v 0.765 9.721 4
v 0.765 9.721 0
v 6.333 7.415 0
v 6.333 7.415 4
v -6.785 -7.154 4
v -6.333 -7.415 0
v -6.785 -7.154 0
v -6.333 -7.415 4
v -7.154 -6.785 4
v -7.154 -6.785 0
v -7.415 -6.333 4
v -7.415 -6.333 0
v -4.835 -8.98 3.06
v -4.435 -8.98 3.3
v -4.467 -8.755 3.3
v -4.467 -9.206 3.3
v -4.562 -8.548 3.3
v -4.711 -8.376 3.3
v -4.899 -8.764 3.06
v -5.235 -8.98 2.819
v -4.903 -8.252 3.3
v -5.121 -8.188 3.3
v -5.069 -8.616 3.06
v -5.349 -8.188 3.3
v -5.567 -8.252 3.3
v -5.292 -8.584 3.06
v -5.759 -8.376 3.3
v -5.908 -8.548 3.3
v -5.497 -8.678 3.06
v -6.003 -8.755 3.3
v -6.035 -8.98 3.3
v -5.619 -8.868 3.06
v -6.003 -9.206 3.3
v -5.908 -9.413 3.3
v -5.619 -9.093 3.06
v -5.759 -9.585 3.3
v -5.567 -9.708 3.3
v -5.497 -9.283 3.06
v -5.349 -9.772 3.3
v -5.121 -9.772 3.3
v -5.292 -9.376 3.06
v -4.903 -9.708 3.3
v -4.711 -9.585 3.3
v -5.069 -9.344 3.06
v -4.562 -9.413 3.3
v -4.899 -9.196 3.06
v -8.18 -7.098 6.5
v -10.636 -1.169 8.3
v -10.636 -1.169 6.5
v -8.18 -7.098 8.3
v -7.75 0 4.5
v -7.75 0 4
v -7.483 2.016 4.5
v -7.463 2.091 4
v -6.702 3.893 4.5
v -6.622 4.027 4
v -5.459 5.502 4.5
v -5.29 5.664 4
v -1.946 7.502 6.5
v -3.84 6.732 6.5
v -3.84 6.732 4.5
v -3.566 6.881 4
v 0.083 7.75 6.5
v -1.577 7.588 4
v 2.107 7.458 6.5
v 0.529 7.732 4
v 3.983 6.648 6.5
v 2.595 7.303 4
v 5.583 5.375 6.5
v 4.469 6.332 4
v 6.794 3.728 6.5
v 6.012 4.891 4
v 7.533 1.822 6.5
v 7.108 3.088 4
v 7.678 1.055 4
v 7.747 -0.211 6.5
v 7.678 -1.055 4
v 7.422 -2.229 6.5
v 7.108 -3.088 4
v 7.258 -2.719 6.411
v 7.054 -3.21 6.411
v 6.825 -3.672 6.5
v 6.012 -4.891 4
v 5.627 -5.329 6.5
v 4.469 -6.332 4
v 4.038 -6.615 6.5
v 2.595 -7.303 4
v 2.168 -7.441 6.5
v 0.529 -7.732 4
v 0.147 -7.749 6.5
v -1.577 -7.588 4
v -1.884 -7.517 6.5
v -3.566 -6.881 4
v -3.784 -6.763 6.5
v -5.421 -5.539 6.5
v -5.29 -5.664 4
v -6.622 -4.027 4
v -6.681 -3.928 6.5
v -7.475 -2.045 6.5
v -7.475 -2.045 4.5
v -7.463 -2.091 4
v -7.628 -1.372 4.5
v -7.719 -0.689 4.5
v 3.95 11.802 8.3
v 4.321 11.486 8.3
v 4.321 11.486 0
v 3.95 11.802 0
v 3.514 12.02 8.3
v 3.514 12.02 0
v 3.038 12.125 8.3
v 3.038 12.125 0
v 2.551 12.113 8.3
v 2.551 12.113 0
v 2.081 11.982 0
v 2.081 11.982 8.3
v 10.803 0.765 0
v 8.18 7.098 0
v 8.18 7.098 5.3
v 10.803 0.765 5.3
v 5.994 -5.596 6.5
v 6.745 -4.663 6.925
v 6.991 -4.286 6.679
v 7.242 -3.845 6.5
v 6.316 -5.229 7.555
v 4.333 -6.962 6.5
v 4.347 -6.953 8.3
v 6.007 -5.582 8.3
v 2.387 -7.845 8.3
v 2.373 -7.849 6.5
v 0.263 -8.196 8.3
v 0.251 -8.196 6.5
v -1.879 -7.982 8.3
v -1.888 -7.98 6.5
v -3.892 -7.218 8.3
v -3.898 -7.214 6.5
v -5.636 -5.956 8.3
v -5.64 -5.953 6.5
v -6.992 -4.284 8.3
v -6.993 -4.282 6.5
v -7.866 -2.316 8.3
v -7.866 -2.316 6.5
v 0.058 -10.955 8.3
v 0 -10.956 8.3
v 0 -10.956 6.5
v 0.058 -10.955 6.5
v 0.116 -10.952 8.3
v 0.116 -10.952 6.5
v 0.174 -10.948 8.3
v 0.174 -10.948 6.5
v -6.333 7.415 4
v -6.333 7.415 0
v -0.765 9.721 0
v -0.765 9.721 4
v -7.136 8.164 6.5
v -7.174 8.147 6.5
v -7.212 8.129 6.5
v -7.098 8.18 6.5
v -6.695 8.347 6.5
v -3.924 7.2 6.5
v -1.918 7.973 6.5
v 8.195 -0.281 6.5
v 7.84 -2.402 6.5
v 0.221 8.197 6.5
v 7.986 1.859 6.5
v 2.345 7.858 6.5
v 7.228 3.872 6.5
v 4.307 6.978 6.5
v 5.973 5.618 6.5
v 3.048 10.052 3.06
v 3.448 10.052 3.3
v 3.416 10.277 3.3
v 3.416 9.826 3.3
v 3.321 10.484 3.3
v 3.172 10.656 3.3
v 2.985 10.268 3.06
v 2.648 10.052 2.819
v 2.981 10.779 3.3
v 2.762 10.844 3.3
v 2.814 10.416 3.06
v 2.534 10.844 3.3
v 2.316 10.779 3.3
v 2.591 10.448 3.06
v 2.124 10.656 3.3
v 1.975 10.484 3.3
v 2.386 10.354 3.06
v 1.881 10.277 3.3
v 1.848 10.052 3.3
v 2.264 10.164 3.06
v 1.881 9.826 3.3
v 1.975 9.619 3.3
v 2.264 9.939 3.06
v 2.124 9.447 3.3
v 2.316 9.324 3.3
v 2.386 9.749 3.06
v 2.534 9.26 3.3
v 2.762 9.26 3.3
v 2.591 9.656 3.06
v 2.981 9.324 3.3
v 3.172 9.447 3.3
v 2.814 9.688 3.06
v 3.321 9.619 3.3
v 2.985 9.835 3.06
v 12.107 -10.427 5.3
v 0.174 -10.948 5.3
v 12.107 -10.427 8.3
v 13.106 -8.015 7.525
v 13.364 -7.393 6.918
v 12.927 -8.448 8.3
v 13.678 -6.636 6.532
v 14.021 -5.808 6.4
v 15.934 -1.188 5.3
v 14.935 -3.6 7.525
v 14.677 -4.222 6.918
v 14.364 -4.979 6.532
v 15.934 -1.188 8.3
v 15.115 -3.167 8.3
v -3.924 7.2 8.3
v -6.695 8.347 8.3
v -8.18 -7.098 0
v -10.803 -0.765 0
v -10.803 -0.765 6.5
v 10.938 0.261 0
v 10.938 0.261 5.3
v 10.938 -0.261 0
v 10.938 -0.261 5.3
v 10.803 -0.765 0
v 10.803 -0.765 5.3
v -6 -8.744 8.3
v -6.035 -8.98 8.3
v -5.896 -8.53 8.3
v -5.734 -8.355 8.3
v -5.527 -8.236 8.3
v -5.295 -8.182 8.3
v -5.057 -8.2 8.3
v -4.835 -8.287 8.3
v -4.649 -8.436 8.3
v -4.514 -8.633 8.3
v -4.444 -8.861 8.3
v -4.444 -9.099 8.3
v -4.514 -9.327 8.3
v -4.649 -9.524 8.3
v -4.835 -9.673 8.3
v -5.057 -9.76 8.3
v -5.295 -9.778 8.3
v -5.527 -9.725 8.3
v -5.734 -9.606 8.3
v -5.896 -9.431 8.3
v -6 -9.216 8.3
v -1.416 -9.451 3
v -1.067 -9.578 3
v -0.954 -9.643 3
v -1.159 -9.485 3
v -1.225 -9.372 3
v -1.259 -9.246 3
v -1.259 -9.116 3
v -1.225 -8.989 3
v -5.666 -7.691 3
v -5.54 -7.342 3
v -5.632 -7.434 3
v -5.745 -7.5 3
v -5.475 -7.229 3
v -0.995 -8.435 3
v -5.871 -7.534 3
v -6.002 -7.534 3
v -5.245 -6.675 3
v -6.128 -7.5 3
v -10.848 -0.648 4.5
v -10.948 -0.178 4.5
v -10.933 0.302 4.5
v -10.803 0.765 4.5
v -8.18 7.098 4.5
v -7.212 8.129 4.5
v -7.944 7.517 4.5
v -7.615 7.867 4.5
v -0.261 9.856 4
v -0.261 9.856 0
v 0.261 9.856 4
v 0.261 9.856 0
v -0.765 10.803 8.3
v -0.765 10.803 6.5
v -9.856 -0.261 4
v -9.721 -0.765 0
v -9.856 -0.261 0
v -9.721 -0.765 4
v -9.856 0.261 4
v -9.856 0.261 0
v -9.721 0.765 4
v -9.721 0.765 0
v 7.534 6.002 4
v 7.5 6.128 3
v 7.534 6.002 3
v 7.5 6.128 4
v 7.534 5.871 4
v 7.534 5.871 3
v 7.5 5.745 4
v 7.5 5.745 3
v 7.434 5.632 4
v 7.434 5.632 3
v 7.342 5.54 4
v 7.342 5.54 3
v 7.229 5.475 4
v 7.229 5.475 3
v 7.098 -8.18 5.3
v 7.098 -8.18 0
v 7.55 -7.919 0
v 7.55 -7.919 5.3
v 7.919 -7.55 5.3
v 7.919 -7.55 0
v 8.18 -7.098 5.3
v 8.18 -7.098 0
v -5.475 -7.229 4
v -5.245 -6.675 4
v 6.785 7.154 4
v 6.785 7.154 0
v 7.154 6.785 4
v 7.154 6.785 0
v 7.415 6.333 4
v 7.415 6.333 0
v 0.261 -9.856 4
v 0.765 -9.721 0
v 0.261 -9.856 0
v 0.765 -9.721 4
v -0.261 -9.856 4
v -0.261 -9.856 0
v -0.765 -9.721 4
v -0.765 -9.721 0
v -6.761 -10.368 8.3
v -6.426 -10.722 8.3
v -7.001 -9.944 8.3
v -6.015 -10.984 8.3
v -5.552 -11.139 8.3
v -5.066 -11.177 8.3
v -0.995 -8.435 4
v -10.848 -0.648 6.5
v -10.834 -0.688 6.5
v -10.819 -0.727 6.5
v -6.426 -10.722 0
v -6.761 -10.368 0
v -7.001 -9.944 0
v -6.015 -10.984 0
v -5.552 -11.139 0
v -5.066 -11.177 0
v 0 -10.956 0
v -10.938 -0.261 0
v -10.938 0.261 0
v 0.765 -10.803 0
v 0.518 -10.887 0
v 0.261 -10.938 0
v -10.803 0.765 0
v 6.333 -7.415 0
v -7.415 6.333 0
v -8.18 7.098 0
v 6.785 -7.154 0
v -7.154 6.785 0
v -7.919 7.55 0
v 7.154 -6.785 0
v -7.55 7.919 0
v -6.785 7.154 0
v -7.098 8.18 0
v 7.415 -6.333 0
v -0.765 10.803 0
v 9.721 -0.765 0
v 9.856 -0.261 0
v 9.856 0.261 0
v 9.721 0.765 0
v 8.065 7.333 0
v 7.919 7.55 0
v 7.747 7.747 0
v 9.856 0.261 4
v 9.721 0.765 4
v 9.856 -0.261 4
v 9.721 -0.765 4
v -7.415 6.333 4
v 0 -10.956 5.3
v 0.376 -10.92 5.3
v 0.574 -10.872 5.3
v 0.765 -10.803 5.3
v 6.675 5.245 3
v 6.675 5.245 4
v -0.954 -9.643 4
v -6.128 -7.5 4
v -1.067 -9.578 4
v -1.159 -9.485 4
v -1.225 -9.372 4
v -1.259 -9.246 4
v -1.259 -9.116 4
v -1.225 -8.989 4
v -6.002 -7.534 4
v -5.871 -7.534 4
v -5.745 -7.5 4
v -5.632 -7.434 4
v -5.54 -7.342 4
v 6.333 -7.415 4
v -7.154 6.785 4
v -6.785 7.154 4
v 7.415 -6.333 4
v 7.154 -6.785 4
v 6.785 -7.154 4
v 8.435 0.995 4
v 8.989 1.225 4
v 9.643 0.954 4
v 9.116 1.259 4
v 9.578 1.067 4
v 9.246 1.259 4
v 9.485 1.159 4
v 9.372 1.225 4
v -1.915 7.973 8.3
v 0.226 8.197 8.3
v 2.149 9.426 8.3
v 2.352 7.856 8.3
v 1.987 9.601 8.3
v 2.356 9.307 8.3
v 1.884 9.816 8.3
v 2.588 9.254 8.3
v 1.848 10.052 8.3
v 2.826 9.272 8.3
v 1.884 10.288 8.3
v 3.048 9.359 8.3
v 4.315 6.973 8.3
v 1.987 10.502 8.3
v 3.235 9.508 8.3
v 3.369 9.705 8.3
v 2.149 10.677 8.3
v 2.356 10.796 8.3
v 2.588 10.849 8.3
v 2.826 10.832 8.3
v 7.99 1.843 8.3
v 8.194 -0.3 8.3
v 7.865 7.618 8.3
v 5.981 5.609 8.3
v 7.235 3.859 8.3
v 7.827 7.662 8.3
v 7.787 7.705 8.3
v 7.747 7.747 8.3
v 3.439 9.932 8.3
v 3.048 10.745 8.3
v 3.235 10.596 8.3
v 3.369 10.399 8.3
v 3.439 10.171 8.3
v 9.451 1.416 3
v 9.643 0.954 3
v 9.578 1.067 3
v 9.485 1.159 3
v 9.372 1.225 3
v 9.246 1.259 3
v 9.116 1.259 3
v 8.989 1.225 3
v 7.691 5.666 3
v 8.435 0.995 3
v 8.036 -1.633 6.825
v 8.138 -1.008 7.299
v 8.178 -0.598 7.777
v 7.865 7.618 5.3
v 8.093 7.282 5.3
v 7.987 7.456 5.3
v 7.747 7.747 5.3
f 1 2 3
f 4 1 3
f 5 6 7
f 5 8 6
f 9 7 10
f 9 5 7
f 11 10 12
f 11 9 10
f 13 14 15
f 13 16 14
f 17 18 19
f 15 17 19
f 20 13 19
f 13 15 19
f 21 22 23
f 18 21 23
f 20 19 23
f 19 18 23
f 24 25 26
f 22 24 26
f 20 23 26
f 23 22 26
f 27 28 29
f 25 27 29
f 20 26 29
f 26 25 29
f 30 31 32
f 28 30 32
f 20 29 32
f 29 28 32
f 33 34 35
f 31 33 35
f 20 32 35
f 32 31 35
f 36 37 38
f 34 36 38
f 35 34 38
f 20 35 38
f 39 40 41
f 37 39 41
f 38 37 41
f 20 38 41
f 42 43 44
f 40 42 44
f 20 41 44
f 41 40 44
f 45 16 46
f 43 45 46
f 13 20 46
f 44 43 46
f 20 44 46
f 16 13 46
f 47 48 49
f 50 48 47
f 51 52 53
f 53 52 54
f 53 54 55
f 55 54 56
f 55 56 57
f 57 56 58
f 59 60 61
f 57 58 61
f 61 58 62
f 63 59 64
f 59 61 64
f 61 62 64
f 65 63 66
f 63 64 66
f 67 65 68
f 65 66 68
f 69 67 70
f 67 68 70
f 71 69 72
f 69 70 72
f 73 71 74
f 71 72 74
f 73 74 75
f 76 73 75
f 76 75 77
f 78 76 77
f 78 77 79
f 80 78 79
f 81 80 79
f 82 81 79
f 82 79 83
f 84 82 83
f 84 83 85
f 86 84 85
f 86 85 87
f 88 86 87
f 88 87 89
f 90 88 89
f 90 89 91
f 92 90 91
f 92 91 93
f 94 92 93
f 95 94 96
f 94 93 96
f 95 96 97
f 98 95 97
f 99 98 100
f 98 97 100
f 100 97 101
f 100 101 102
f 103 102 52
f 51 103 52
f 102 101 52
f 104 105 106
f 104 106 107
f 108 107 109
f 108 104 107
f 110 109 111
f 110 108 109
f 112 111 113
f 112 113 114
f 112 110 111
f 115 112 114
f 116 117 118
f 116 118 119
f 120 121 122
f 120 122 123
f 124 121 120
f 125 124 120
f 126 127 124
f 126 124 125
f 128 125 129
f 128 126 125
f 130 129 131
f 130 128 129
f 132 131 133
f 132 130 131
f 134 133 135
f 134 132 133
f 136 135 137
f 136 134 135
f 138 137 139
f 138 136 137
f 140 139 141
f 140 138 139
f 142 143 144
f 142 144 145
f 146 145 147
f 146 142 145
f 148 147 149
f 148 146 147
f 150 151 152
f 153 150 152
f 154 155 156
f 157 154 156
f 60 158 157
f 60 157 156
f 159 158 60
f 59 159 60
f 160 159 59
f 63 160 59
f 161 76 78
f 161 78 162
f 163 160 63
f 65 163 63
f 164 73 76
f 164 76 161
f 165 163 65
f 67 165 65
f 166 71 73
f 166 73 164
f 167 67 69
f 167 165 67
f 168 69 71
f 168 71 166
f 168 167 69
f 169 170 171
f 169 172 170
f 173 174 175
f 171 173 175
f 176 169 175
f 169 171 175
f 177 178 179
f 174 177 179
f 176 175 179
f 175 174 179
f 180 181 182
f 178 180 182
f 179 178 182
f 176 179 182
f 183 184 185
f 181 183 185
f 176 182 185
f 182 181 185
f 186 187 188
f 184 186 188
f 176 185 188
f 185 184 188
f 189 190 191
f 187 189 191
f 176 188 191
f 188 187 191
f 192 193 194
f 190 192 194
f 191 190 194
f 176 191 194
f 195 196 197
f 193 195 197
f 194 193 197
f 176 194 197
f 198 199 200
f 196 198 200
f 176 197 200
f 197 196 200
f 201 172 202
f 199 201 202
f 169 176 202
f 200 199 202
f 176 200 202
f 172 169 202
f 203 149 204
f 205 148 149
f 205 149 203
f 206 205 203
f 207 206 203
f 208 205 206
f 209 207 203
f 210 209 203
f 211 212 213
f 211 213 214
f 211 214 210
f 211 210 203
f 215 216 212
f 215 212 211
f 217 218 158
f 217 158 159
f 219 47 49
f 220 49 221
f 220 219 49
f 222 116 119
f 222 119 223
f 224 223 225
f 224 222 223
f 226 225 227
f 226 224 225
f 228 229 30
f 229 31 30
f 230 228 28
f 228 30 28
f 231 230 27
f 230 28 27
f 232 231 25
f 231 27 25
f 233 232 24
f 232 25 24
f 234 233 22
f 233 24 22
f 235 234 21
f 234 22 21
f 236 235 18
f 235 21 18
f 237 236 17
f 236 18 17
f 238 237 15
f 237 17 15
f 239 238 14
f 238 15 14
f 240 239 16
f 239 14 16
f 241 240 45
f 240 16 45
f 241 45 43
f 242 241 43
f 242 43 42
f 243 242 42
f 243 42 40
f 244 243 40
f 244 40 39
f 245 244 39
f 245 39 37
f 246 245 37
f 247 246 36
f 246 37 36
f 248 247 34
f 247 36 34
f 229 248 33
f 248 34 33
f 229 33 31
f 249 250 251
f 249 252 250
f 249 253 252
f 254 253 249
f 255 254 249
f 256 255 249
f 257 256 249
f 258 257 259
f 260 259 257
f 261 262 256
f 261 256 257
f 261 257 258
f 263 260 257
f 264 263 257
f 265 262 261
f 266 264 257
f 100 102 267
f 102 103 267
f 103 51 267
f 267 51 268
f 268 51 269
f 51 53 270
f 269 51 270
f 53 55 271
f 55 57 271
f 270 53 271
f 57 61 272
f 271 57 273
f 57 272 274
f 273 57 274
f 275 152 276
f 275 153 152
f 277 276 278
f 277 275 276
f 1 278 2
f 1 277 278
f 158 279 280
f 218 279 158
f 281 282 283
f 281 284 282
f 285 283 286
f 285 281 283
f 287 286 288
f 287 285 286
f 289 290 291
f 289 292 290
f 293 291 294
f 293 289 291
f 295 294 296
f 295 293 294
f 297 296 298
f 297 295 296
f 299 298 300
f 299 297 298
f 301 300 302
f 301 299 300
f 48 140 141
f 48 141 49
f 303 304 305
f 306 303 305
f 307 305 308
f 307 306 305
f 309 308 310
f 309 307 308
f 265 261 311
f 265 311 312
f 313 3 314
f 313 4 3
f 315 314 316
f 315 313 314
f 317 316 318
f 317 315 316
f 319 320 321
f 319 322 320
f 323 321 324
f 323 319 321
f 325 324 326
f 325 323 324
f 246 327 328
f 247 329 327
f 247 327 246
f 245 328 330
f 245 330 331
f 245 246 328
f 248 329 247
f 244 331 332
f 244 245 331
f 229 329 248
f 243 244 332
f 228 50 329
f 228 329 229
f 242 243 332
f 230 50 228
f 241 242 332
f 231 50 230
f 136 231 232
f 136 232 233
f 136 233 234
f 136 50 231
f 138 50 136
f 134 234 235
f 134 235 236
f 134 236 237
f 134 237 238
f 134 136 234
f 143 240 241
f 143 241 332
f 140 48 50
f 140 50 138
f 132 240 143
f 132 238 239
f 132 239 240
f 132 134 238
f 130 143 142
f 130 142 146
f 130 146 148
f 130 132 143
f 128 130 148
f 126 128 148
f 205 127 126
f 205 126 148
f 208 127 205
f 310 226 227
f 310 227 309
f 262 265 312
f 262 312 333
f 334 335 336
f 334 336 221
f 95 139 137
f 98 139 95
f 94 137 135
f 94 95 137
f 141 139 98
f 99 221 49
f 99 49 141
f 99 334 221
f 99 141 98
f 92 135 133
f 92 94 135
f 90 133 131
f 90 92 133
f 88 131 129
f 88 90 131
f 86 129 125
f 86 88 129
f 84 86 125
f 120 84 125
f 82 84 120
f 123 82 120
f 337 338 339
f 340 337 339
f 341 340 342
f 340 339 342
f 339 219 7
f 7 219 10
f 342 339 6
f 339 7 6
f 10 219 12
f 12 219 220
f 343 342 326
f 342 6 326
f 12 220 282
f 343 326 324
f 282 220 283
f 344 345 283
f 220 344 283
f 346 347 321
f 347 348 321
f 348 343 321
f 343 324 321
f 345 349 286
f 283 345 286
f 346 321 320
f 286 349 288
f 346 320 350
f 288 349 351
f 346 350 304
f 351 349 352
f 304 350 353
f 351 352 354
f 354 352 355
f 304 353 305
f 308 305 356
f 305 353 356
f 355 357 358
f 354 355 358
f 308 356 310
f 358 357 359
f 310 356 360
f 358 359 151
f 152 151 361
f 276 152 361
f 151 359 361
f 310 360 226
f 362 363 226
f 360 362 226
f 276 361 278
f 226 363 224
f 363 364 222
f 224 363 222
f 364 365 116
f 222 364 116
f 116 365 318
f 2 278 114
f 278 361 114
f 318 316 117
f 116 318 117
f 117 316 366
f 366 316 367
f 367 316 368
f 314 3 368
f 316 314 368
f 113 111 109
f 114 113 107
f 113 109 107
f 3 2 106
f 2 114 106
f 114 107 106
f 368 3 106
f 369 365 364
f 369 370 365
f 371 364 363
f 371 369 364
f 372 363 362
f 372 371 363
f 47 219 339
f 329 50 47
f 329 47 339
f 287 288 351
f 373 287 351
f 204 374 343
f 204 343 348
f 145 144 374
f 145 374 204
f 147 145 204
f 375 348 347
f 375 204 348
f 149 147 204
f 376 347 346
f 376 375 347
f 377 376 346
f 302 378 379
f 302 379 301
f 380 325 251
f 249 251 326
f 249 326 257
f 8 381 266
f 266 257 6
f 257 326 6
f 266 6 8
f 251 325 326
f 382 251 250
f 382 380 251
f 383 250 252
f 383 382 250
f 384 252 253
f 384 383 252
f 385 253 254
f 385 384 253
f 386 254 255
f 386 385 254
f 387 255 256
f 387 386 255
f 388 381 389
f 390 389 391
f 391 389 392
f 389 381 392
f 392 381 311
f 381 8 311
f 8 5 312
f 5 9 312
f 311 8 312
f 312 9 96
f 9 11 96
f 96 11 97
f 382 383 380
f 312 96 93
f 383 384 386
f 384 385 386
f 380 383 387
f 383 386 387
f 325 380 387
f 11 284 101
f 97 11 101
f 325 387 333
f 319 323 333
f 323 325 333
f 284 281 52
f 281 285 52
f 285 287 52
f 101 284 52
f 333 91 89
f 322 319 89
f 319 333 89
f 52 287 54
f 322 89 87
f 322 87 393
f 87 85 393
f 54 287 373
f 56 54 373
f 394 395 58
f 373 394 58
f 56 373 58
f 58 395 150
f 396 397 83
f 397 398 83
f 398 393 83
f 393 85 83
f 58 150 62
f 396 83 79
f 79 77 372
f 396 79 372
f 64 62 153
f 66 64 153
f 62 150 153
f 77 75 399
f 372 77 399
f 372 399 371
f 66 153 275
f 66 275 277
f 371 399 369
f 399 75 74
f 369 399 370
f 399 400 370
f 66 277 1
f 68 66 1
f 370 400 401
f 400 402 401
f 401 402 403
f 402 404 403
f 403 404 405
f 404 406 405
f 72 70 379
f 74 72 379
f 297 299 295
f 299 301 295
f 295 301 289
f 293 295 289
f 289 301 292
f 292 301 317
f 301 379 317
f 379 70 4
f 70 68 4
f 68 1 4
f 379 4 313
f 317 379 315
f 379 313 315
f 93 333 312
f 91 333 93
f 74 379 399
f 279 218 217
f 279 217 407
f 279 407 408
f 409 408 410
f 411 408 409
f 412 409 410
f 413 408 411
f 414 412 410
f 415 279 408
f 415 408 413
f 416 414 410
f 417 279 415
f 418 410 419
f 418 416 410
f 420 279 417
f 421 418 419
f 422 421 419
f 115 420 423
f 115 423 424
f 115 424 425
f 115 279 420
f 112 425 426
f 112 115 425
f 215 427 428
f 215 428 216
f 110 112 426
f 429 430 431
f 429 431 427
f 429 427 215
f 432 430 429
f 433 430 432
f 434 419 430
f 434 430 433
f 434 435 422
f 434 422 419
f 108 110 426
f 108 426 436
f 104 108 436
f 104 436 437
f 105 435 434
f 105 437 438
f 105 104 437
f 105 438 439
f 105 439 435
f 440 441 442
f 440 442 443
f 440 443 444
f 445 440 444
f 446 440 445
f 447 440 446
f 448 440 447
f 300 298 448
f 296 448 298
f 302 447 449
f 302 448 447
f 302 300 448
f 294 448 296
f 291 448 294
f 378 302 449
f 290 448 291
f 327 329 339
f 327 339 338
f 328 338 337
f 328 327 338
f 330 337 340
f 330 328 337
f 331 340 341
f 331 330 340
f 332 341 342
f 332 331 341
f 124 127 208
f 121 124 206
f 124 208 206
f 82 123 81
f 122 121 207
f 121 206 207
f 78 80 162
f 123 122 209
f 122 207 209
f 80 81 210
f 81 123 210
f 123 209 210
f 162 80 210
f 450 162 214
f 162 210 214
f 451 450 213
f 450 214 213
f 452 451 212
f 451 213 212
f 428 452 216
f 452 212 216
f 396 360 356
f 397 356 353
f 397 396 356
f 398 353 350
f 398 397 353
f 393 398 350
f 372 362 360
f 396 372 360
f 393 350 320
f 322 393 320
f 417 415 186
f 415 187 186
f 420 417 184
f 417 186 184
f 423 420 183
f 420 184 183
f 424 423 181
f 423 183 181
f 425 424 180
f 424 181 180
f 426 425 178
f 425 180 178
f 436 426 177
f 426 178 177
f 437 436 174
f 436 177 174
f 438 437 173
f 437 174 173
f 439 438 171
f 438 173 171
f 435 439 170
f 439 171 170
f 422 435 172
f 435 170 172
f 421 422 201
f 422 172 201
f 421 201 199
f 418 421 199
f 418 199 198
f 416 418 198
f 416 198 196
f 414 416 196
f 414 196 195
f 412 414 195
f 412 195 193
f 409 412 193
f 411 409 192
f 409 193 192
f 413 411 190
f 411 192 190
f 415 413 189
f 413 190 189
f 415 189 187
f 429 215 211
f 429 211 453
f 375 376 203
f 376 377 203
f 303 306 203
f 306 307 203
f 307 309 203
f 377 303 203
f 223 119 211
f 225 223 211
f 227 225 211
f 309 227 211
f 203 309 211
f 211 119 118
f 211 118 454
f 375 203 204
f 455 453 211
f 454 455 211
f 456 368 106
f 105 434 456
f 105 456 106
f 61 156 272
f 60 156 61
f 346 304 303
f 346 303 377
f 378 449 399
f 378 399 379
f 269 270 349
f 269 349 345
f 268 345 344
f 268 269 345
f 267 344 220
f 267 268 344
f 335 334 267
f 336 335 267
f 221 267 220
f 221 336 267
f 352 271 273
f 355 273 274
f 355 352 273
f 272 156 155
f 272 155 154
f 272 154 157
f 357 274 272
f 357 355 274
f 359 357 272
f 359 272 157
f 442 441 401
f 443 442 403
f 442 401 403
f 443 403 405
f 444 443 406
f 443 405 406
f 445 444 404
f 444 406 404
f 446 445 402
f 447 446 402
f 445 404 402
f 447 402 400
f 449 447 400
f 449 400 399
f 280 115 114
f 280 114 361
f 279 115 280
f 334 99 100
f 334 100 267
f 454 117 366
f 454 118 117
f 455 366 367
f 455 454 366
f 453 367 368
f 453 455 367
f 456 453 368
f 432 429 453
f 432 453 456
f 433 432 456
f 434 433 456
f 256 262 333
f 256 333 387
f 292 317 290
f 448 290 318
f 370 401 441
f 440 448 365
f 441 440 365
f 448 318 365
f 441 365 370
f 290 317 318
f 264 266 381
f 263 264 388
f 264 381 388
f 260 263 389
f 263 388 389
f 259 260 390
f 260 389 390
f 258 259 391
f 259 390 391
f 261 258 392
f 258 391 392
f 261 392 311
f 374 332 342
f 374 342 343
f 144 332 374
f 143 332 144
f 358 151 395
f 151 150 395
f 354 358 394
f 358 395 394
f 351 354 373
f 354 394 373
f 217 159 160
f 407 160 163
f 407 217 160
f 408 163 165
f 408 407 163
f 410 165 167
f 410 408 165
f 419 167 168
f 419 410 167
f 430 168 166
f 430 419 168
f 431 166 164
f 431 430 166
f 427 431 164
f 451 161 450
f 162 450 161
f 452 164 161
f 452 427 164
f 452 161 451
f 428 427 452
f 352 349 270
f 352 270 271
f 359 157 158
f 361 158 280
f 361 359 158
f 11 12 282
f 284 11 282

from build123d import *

# Parameters (mm, degrees)
BOSS_EXTRUDE1_DEPTH             = 6
BOSS_EXTRUDE1_2_DEPTH           = 6
CUT_EXTRUDE1_DEPTH              = 4
BOSS_EXTRUDE2_DEPTH             = 0.5
BOSS_EXTRUDE2_DEPTH_BACK        = 2
BOSS_EXTRUDE3_REACH             = 22.017
BOSS_EXTRUDE3_START             = -3
SKETCH6_R                       = 7.75
CUT_EXTRUDE2_DEPTH              = 17.227295759
FILLET1_R                       = 2
BOSS_EXTRUDE4_START             = 1.8
BOSS_EXTRUDE4_DEPTH             = 1.8
CUT_EXTRUDE3_DEPTH              = 2
BOSS_EXTRUDE5_DEPTH             = 3
CUT_EXTRUDE4_REACH              = 33.204
CUT_EXTRUDE4_END_RADIUS         = 7.75
SKETCH11_R                      = 3.1
BOSS_EXTRUDE6_DEPTH             = 8.3
TAP_DRILL_FOR_M2X0_4_TAP1_D     = 1.6
TAP_DRILL_FOR_M2X0_4_TAP1_DEPTH = 5
TAP_DRILL_FOR_M2X0_4_TAP1_TIP   = 0.480688495
FILLET2_R                       = 0.5


with BuildPart() as part:
    # Sketch1 → Boss-Extrude1 (new body)
    with BuildSketch(Plane.XY):
        Polygon((-8.605017992, 0), (-6.084666575, 6.084666575), (0, 8.605017992), (6.084666575, 6.084666575), (8.605017992, 0), (6.084666575, -6.084666575), (0, -8.605017992), (-6.084666575, -6.084666575), align=None)
    extrude(amount=BOSS_EXTRUDE1_DEPTH)

    # Sketch3 → Cut-Extrude1 (cut)
    with BuildSketch(Plane(origin=(0, 0, 0), x_dir=(-1, 0, 0), z_dir=(0, 0, -1))):
        Polygon((6.084666575, 6.084666575), (0, 8.605017992), (-6.084666575, 6.084666575), (-8.605017992, 0), (-6.084666575, -6.084666575), (0, -8.605017992), (6.084666575, -6.084666575), (8.605017992, 0), align=None)
    extrude(amount=-CUT_EXTRUDE1_DEPTH, mode=Mode.SUBTRACT)



with BuildPart() as body_2:
    # Sketch1 → Boss-Extrude1 2 (new body)
    with BuildSketch(Plane.XY):
        Polygon((-11.120367073, 0), (-7.863286966, 7.863286966), (0, 11.120367073), (7.863286966, 7.863286966), (11.120367073, 0), (7.863286966, -7.863286966), (0, -11.120367073), (-7.863286966, -7.863286966), align=None)
        Polygon((-7.097920102, 7.097920102), (0, 10.037974872), (7.097920102, 7.097920102), (10.037974872, 0), (7.097920102, -7.097920102), (0, -10.037974872), (-7.097920102, -7.097920102), (-10.037974872, 0), align=None, mode=Mode.SUBTRACT)
    extrude(amount=BOSS_EXTRUDE1_2_DEPTH)


with BuildPart() as part_1:
    add(part.part)

    add(body_2.part)  # Boss-Extrude2 merges body 2
    # Sketch4 → Boss-Extrude2 (add, two sides: drawn at the far end of the back side and taken through both)
    with BuildSketch(Plane.XY.offset(6).offset(-BOSS_EXTRUDE2_DEPTH_BACK)):
        Polygon((-11.120367073, 0), (-7.863286966, -7.863286966), (0, -11.120367073), (7.863286966, -7.863286966), (11.120367073, 0), (7.863286966, 7.863286966), (0, 11.120367073), (-7.863286966, 7.863286966), align=None)
    extrude(amount=BOSS_EXTRUDE2_DEPTH + BOSS_EXTRUDE2_DEPTH_BACK)

    # Sketch5 → Boss-Extrude3 (add, up to next)
    with BuildSketch(Plane(origin=(0, 0, 0), x_dir=(-1, 0, 0), z_dir=(0, 0, -1)).offset(BOSS_EXTRUDE3_START), mode=Mode.PRIVATE) as boss_extrude3_sk1:
        Polygon((-7.691079422, 5.665906826), (-9.451423211, 1.416060977), (-8.435155725, 0.995109201), (-6.674811936, 5.244955051), align=None)
    boss_extrude3_tool1 = extrude(boss_extrude3_sk1.sketch, amount=-BOSS_EXTRUDE3_REACH, mode=Mode.PRIVATE) - part_1.part
    # Sketch5 → Boss-Extrude3 (add, up to next)
    with BuildSketch(Plane(origin=(0, 0, 0), x_dir=(-1, 0, 0), z_dir=(0, 0, -1)).offset(BOSS_EXTRUDE3_START), mode=Mode.PRIVATE) as boss_extrude3_sk2:
        Polygon((1.416060977, -9.451423211), (5.665906826, -7.691079422), (5.244955051, -6.674811936), (0.995109201, -8.435155725), align=None)
    boss_extrude3_tool2 = extrude(boss_extrude3_sk2.sketch, amount=-BOSS_EXTRUDE3_REACH, mode=Mode.PRIVATE) - part_1.part
    add(boss_extrude3_tool1.solids().sort_by_distance((8.063118, 3.330508, 3))[0])
    add(boss_extrude3_tool2.solids().sort_by_distance((-3.330508, -8.063118, 3))[0])

    # Sketch6 → Cut-Extrude2 (cut, through all)
    with BuildSketch(Plane(origin=(0, 0, 4), x_dir=(-1, 0, 0), z_dir=(0, 0, -1))):
        Circle(SKETCH6_R)
    extrude(amount=-CUT_EXTRUDE2_DEPTH, mode=Mode.SUBTRACT)

    # Fillet1
    fillet1_edges = [part_1.edges().sort_by_distance(p)[0] for p in [
        (-7.863286966, -7.863286966, 3.25),
        (0, -11.120367073, 3.25),
        (7.863286966, -7.863286966, 3.25),
        (11.120367073, 0, 3.25),
        (7.863286966, 7.863286966, 3.25),
        (0, 11.120367073, 3.25),
        (-7.863286966, 7.863286966, 3.25),
        (-11.120367073, 0, 3.25),
        (7.097920102, 7.097920102, 2),
        (0, 10.037974872, 2),
        (10.037974872, 0, 2),
        (7.097920102, -7.097920102, 2),
        (0, -10.037974872, 2),
        (-7.097920102, -7.097920102, 2),
        (-10.037974872, 0, 2),
        (-7.097920102, 7.097920102, 2),
    ]]
    fillet(fillet1_edges, radius=FILLET1_R)

    # Sketch9 → Boss-Extrude4 (add)
    with BuildSketch(Plane.XY.offset(6.5).offset(BOSS_EXTRUDE4_START)):
        with BuildLine():
            ThreePointArc((8.180312302, 7.097920102), (7.746766799, 7.746766799), (7.097920102, 8.180312302))
            Line((7.097920102, 8.180312302), (0.765366865, 10.803341737))
            ThreePointArc((0.765366865, 10.803341737), (0, 10.955582672), (-0.765366865, 10.803341737))
            Line((-0.765366865, 10.803341737), (-6.694671234, 8.347343452))
            Line((-6.694671234, 8.347343452), (-3.924480161, 7.19989274))
            ThreePointArc((-3.924480161, 7.19989274), (7.575812167, -3.138004145), (-7.866119515, -2.316066445))
            Line((-7.866119515, -2.316066445), (-10.636310587, -1.168615733))
            Line((-10.636310587, -1.168615733), (-8.180312302, -7.097920102))
            ThreePointArc((-8.180312302, -7.097920102), (-7.746766799, -7.746766799), (-7.097920102, -8.180312302))
            Line((-7.097920102, -8.180312302), (-0.765366865, -10.803341737))
            ThreePointArc((-0.765366865, -10.803341737), (0, -10.955582672), (0.765366865, -10.803341737))
            Line((0.765366865, -10.803341737), (7.097920102, -8.180312302))
            ThreePointArc((7.097920102, -8.180312302), (7.746766799, -7.746766799), (8.180312302, -7.097920102))
            Line((8.180312302, -7.097920102), (10.803341737, -0.765366865))
            ThreePointArc((10.803341737, -0.765366865), (10.955582672, 0), (10.803341737, 0.765366865))
            Line((10.803341737, 0.765366865), (8.180312302, 7.097920102))
        make_face()
    extrude(amount=-BOSS_EXTRUDE4_DEPTH)

    # Sketch10 → Cut-Extrude3 (cut)
    with BuildSketch(Plane.XY.offset(6.5)):
        Polygon((-8.848789177, 8.806651439), (-3.151903136, 6.446923978), (-6.787395744, -2.329931581), (-12.484281785, 0.02979588), align=None)
    extrude(amount=-CUT_EXTRUDE3_DEPTH, mode=Mode.SUBTRACT)

    # Sketch12 → Boss-Extrude5 (add)
    with BuildSketch(Plane.XY.offset(8.3)):
        with BuildLine():
            Line((0, -10.955582672), (12.107294918, -10.42696676))
            Line((12.107294918, -10.42696676), (15.934129241, -1.188171435))
            Line((15.934129241, -1.188171435), (7.746766799, 7.746766799))
            Line((7.746766799, 7.746766799), (7.287962899, 6.639116202))
            Line((7.287962899, 6.639116202), (9.879462205, 0.382683432))
            ThreePointArc((9.879462205, 0.382683432), (9.955582672, 0), (9.879462205, -0.382683432))
            Line((9.879462205, -0.382683432), (7.256432769, -6.715236669))
            ThreePointArc((7.256432769, -6.715236669), (7.039660018, -7.039660018), (6.715236669, -7.256432769))
            Line((6.715236669, -7.256432769), (0.4588039, -9.847932075))
            Line((0.4588039, -9.847932075), (0, -10.955582672))
        make_face()
    extrude(amount=-BOSS_EXTRUDE5_DEPTH)

    # Cut-Extrude4: up to this cylinder (the profile starts outside it)
    cut_extrude4_end = Plane(origin=(0, 0, 9.5), z_dir=(0, 0, -1)) * Cylinder(CUT_EXTRUDE4_END_RADIUS, 82.908, mode=Mode.PRIVATE)
    # Sketch11 → Cut-Extrude4 (cut, up to the surface)
    with BuildSketch(Plane(origin=(14.020712079, -5.807569097, 0), x_dir=(0, 0, -1), z_dir=(0.9238795325112878, -0.38268343236508723, 0)), mode=Mode.PRIVATE) as cut_extrude4_sk1:
        with Locations((-9.5, 0)):
            Circle(SKETCH11_R)
    cut_extrude4_tool1 = extrude(cut_extrude4_sk1.sketch, amount=-CUT_EXTRUDE4_REACH, mode=Mode.PRIVATE) - cut_extrude4_end
    add(cut_extrude4_tool1.solids().sort_by_distance((14.020712, -5.807569, 9.5))[0], mode=Mode.SUBTRACT)

    # Sketch13 → Boss-Extrude6 (add)
    with BuildSketch(Plane.XY.offset(8.3)):
        with BuildLine():
            Line((-8.180312302, -7.097920102), (-7.001403735, -9.944057152))
            ThreePointArc((-7.001403735, -9.944057152), (-6.228243887, -10.865473179), (-5.066405895, -11.176786731))
            Line((-5.066405895, -11.176786731), (0.174311485, -10.947972068))
            Line((0.174311485, -10.947972068), (-8.180312302, -7.097920102))
        make_face()
        with BuildLine():
            Line((7.864642123, 7.618128456), (4.320691724, 11.485671654))
            ThreePointArc((4.320691724, 11.485671654), (3.279016278, 12.087083253), (2.080770186, 11.982250304))
            Line((2.080770186, 11.982250304), (-0.765366865, 10.803341737))
            Line((-0.765366865, 10.803341737), (7.864642123, 7.618128456))
        make_face()
    extrude(amount=-BOSS_EXTRUDE6_DEPTH)

    # Tap Drill for M2x0.4 Tap1
    with Locations(Plane.XY.offset(8.3)):
        with Locations((-5.235070699, -8.98020238), (2.648208008, 10.05171599)):
            Hole(TAP_DRILL_FOR_M2X0_4_TAP1_D / 2, depth=TAP_DRILL_FOR_M2X0_4_TAP1_DEPTH)
            with Locations((0, 0, -(TAP_DRILL_FOR_M2X0_4_TAP1_DEPTH + TAP_DRILL_FOR_M2X0_4_TAP1_TIP / 2))):  # 118° drill point
                Cone(0, TAP_DRILL_FOR_M2X0_4_TAP1_D / 2, TAP_DRILL_FOR_M2X0_4_TAP1_TIP, mode=Mode.SUBTRACT)

    # Fillet2
    fillet2_edges = [part_1.edges().sort_by_distance(p)[0] for p in [
        (9.451423211, 1.416060977, 3.5),
        (7.691079422, 5.665906826, 3.5),
        (-5.665906826, -7.691079422, 3.5),
        (-1.416060977, -9.451423211, 3.5),
    ]]
    fillet(fillet2_edges, radius=FILLET2_R)


solid = part_1.part
